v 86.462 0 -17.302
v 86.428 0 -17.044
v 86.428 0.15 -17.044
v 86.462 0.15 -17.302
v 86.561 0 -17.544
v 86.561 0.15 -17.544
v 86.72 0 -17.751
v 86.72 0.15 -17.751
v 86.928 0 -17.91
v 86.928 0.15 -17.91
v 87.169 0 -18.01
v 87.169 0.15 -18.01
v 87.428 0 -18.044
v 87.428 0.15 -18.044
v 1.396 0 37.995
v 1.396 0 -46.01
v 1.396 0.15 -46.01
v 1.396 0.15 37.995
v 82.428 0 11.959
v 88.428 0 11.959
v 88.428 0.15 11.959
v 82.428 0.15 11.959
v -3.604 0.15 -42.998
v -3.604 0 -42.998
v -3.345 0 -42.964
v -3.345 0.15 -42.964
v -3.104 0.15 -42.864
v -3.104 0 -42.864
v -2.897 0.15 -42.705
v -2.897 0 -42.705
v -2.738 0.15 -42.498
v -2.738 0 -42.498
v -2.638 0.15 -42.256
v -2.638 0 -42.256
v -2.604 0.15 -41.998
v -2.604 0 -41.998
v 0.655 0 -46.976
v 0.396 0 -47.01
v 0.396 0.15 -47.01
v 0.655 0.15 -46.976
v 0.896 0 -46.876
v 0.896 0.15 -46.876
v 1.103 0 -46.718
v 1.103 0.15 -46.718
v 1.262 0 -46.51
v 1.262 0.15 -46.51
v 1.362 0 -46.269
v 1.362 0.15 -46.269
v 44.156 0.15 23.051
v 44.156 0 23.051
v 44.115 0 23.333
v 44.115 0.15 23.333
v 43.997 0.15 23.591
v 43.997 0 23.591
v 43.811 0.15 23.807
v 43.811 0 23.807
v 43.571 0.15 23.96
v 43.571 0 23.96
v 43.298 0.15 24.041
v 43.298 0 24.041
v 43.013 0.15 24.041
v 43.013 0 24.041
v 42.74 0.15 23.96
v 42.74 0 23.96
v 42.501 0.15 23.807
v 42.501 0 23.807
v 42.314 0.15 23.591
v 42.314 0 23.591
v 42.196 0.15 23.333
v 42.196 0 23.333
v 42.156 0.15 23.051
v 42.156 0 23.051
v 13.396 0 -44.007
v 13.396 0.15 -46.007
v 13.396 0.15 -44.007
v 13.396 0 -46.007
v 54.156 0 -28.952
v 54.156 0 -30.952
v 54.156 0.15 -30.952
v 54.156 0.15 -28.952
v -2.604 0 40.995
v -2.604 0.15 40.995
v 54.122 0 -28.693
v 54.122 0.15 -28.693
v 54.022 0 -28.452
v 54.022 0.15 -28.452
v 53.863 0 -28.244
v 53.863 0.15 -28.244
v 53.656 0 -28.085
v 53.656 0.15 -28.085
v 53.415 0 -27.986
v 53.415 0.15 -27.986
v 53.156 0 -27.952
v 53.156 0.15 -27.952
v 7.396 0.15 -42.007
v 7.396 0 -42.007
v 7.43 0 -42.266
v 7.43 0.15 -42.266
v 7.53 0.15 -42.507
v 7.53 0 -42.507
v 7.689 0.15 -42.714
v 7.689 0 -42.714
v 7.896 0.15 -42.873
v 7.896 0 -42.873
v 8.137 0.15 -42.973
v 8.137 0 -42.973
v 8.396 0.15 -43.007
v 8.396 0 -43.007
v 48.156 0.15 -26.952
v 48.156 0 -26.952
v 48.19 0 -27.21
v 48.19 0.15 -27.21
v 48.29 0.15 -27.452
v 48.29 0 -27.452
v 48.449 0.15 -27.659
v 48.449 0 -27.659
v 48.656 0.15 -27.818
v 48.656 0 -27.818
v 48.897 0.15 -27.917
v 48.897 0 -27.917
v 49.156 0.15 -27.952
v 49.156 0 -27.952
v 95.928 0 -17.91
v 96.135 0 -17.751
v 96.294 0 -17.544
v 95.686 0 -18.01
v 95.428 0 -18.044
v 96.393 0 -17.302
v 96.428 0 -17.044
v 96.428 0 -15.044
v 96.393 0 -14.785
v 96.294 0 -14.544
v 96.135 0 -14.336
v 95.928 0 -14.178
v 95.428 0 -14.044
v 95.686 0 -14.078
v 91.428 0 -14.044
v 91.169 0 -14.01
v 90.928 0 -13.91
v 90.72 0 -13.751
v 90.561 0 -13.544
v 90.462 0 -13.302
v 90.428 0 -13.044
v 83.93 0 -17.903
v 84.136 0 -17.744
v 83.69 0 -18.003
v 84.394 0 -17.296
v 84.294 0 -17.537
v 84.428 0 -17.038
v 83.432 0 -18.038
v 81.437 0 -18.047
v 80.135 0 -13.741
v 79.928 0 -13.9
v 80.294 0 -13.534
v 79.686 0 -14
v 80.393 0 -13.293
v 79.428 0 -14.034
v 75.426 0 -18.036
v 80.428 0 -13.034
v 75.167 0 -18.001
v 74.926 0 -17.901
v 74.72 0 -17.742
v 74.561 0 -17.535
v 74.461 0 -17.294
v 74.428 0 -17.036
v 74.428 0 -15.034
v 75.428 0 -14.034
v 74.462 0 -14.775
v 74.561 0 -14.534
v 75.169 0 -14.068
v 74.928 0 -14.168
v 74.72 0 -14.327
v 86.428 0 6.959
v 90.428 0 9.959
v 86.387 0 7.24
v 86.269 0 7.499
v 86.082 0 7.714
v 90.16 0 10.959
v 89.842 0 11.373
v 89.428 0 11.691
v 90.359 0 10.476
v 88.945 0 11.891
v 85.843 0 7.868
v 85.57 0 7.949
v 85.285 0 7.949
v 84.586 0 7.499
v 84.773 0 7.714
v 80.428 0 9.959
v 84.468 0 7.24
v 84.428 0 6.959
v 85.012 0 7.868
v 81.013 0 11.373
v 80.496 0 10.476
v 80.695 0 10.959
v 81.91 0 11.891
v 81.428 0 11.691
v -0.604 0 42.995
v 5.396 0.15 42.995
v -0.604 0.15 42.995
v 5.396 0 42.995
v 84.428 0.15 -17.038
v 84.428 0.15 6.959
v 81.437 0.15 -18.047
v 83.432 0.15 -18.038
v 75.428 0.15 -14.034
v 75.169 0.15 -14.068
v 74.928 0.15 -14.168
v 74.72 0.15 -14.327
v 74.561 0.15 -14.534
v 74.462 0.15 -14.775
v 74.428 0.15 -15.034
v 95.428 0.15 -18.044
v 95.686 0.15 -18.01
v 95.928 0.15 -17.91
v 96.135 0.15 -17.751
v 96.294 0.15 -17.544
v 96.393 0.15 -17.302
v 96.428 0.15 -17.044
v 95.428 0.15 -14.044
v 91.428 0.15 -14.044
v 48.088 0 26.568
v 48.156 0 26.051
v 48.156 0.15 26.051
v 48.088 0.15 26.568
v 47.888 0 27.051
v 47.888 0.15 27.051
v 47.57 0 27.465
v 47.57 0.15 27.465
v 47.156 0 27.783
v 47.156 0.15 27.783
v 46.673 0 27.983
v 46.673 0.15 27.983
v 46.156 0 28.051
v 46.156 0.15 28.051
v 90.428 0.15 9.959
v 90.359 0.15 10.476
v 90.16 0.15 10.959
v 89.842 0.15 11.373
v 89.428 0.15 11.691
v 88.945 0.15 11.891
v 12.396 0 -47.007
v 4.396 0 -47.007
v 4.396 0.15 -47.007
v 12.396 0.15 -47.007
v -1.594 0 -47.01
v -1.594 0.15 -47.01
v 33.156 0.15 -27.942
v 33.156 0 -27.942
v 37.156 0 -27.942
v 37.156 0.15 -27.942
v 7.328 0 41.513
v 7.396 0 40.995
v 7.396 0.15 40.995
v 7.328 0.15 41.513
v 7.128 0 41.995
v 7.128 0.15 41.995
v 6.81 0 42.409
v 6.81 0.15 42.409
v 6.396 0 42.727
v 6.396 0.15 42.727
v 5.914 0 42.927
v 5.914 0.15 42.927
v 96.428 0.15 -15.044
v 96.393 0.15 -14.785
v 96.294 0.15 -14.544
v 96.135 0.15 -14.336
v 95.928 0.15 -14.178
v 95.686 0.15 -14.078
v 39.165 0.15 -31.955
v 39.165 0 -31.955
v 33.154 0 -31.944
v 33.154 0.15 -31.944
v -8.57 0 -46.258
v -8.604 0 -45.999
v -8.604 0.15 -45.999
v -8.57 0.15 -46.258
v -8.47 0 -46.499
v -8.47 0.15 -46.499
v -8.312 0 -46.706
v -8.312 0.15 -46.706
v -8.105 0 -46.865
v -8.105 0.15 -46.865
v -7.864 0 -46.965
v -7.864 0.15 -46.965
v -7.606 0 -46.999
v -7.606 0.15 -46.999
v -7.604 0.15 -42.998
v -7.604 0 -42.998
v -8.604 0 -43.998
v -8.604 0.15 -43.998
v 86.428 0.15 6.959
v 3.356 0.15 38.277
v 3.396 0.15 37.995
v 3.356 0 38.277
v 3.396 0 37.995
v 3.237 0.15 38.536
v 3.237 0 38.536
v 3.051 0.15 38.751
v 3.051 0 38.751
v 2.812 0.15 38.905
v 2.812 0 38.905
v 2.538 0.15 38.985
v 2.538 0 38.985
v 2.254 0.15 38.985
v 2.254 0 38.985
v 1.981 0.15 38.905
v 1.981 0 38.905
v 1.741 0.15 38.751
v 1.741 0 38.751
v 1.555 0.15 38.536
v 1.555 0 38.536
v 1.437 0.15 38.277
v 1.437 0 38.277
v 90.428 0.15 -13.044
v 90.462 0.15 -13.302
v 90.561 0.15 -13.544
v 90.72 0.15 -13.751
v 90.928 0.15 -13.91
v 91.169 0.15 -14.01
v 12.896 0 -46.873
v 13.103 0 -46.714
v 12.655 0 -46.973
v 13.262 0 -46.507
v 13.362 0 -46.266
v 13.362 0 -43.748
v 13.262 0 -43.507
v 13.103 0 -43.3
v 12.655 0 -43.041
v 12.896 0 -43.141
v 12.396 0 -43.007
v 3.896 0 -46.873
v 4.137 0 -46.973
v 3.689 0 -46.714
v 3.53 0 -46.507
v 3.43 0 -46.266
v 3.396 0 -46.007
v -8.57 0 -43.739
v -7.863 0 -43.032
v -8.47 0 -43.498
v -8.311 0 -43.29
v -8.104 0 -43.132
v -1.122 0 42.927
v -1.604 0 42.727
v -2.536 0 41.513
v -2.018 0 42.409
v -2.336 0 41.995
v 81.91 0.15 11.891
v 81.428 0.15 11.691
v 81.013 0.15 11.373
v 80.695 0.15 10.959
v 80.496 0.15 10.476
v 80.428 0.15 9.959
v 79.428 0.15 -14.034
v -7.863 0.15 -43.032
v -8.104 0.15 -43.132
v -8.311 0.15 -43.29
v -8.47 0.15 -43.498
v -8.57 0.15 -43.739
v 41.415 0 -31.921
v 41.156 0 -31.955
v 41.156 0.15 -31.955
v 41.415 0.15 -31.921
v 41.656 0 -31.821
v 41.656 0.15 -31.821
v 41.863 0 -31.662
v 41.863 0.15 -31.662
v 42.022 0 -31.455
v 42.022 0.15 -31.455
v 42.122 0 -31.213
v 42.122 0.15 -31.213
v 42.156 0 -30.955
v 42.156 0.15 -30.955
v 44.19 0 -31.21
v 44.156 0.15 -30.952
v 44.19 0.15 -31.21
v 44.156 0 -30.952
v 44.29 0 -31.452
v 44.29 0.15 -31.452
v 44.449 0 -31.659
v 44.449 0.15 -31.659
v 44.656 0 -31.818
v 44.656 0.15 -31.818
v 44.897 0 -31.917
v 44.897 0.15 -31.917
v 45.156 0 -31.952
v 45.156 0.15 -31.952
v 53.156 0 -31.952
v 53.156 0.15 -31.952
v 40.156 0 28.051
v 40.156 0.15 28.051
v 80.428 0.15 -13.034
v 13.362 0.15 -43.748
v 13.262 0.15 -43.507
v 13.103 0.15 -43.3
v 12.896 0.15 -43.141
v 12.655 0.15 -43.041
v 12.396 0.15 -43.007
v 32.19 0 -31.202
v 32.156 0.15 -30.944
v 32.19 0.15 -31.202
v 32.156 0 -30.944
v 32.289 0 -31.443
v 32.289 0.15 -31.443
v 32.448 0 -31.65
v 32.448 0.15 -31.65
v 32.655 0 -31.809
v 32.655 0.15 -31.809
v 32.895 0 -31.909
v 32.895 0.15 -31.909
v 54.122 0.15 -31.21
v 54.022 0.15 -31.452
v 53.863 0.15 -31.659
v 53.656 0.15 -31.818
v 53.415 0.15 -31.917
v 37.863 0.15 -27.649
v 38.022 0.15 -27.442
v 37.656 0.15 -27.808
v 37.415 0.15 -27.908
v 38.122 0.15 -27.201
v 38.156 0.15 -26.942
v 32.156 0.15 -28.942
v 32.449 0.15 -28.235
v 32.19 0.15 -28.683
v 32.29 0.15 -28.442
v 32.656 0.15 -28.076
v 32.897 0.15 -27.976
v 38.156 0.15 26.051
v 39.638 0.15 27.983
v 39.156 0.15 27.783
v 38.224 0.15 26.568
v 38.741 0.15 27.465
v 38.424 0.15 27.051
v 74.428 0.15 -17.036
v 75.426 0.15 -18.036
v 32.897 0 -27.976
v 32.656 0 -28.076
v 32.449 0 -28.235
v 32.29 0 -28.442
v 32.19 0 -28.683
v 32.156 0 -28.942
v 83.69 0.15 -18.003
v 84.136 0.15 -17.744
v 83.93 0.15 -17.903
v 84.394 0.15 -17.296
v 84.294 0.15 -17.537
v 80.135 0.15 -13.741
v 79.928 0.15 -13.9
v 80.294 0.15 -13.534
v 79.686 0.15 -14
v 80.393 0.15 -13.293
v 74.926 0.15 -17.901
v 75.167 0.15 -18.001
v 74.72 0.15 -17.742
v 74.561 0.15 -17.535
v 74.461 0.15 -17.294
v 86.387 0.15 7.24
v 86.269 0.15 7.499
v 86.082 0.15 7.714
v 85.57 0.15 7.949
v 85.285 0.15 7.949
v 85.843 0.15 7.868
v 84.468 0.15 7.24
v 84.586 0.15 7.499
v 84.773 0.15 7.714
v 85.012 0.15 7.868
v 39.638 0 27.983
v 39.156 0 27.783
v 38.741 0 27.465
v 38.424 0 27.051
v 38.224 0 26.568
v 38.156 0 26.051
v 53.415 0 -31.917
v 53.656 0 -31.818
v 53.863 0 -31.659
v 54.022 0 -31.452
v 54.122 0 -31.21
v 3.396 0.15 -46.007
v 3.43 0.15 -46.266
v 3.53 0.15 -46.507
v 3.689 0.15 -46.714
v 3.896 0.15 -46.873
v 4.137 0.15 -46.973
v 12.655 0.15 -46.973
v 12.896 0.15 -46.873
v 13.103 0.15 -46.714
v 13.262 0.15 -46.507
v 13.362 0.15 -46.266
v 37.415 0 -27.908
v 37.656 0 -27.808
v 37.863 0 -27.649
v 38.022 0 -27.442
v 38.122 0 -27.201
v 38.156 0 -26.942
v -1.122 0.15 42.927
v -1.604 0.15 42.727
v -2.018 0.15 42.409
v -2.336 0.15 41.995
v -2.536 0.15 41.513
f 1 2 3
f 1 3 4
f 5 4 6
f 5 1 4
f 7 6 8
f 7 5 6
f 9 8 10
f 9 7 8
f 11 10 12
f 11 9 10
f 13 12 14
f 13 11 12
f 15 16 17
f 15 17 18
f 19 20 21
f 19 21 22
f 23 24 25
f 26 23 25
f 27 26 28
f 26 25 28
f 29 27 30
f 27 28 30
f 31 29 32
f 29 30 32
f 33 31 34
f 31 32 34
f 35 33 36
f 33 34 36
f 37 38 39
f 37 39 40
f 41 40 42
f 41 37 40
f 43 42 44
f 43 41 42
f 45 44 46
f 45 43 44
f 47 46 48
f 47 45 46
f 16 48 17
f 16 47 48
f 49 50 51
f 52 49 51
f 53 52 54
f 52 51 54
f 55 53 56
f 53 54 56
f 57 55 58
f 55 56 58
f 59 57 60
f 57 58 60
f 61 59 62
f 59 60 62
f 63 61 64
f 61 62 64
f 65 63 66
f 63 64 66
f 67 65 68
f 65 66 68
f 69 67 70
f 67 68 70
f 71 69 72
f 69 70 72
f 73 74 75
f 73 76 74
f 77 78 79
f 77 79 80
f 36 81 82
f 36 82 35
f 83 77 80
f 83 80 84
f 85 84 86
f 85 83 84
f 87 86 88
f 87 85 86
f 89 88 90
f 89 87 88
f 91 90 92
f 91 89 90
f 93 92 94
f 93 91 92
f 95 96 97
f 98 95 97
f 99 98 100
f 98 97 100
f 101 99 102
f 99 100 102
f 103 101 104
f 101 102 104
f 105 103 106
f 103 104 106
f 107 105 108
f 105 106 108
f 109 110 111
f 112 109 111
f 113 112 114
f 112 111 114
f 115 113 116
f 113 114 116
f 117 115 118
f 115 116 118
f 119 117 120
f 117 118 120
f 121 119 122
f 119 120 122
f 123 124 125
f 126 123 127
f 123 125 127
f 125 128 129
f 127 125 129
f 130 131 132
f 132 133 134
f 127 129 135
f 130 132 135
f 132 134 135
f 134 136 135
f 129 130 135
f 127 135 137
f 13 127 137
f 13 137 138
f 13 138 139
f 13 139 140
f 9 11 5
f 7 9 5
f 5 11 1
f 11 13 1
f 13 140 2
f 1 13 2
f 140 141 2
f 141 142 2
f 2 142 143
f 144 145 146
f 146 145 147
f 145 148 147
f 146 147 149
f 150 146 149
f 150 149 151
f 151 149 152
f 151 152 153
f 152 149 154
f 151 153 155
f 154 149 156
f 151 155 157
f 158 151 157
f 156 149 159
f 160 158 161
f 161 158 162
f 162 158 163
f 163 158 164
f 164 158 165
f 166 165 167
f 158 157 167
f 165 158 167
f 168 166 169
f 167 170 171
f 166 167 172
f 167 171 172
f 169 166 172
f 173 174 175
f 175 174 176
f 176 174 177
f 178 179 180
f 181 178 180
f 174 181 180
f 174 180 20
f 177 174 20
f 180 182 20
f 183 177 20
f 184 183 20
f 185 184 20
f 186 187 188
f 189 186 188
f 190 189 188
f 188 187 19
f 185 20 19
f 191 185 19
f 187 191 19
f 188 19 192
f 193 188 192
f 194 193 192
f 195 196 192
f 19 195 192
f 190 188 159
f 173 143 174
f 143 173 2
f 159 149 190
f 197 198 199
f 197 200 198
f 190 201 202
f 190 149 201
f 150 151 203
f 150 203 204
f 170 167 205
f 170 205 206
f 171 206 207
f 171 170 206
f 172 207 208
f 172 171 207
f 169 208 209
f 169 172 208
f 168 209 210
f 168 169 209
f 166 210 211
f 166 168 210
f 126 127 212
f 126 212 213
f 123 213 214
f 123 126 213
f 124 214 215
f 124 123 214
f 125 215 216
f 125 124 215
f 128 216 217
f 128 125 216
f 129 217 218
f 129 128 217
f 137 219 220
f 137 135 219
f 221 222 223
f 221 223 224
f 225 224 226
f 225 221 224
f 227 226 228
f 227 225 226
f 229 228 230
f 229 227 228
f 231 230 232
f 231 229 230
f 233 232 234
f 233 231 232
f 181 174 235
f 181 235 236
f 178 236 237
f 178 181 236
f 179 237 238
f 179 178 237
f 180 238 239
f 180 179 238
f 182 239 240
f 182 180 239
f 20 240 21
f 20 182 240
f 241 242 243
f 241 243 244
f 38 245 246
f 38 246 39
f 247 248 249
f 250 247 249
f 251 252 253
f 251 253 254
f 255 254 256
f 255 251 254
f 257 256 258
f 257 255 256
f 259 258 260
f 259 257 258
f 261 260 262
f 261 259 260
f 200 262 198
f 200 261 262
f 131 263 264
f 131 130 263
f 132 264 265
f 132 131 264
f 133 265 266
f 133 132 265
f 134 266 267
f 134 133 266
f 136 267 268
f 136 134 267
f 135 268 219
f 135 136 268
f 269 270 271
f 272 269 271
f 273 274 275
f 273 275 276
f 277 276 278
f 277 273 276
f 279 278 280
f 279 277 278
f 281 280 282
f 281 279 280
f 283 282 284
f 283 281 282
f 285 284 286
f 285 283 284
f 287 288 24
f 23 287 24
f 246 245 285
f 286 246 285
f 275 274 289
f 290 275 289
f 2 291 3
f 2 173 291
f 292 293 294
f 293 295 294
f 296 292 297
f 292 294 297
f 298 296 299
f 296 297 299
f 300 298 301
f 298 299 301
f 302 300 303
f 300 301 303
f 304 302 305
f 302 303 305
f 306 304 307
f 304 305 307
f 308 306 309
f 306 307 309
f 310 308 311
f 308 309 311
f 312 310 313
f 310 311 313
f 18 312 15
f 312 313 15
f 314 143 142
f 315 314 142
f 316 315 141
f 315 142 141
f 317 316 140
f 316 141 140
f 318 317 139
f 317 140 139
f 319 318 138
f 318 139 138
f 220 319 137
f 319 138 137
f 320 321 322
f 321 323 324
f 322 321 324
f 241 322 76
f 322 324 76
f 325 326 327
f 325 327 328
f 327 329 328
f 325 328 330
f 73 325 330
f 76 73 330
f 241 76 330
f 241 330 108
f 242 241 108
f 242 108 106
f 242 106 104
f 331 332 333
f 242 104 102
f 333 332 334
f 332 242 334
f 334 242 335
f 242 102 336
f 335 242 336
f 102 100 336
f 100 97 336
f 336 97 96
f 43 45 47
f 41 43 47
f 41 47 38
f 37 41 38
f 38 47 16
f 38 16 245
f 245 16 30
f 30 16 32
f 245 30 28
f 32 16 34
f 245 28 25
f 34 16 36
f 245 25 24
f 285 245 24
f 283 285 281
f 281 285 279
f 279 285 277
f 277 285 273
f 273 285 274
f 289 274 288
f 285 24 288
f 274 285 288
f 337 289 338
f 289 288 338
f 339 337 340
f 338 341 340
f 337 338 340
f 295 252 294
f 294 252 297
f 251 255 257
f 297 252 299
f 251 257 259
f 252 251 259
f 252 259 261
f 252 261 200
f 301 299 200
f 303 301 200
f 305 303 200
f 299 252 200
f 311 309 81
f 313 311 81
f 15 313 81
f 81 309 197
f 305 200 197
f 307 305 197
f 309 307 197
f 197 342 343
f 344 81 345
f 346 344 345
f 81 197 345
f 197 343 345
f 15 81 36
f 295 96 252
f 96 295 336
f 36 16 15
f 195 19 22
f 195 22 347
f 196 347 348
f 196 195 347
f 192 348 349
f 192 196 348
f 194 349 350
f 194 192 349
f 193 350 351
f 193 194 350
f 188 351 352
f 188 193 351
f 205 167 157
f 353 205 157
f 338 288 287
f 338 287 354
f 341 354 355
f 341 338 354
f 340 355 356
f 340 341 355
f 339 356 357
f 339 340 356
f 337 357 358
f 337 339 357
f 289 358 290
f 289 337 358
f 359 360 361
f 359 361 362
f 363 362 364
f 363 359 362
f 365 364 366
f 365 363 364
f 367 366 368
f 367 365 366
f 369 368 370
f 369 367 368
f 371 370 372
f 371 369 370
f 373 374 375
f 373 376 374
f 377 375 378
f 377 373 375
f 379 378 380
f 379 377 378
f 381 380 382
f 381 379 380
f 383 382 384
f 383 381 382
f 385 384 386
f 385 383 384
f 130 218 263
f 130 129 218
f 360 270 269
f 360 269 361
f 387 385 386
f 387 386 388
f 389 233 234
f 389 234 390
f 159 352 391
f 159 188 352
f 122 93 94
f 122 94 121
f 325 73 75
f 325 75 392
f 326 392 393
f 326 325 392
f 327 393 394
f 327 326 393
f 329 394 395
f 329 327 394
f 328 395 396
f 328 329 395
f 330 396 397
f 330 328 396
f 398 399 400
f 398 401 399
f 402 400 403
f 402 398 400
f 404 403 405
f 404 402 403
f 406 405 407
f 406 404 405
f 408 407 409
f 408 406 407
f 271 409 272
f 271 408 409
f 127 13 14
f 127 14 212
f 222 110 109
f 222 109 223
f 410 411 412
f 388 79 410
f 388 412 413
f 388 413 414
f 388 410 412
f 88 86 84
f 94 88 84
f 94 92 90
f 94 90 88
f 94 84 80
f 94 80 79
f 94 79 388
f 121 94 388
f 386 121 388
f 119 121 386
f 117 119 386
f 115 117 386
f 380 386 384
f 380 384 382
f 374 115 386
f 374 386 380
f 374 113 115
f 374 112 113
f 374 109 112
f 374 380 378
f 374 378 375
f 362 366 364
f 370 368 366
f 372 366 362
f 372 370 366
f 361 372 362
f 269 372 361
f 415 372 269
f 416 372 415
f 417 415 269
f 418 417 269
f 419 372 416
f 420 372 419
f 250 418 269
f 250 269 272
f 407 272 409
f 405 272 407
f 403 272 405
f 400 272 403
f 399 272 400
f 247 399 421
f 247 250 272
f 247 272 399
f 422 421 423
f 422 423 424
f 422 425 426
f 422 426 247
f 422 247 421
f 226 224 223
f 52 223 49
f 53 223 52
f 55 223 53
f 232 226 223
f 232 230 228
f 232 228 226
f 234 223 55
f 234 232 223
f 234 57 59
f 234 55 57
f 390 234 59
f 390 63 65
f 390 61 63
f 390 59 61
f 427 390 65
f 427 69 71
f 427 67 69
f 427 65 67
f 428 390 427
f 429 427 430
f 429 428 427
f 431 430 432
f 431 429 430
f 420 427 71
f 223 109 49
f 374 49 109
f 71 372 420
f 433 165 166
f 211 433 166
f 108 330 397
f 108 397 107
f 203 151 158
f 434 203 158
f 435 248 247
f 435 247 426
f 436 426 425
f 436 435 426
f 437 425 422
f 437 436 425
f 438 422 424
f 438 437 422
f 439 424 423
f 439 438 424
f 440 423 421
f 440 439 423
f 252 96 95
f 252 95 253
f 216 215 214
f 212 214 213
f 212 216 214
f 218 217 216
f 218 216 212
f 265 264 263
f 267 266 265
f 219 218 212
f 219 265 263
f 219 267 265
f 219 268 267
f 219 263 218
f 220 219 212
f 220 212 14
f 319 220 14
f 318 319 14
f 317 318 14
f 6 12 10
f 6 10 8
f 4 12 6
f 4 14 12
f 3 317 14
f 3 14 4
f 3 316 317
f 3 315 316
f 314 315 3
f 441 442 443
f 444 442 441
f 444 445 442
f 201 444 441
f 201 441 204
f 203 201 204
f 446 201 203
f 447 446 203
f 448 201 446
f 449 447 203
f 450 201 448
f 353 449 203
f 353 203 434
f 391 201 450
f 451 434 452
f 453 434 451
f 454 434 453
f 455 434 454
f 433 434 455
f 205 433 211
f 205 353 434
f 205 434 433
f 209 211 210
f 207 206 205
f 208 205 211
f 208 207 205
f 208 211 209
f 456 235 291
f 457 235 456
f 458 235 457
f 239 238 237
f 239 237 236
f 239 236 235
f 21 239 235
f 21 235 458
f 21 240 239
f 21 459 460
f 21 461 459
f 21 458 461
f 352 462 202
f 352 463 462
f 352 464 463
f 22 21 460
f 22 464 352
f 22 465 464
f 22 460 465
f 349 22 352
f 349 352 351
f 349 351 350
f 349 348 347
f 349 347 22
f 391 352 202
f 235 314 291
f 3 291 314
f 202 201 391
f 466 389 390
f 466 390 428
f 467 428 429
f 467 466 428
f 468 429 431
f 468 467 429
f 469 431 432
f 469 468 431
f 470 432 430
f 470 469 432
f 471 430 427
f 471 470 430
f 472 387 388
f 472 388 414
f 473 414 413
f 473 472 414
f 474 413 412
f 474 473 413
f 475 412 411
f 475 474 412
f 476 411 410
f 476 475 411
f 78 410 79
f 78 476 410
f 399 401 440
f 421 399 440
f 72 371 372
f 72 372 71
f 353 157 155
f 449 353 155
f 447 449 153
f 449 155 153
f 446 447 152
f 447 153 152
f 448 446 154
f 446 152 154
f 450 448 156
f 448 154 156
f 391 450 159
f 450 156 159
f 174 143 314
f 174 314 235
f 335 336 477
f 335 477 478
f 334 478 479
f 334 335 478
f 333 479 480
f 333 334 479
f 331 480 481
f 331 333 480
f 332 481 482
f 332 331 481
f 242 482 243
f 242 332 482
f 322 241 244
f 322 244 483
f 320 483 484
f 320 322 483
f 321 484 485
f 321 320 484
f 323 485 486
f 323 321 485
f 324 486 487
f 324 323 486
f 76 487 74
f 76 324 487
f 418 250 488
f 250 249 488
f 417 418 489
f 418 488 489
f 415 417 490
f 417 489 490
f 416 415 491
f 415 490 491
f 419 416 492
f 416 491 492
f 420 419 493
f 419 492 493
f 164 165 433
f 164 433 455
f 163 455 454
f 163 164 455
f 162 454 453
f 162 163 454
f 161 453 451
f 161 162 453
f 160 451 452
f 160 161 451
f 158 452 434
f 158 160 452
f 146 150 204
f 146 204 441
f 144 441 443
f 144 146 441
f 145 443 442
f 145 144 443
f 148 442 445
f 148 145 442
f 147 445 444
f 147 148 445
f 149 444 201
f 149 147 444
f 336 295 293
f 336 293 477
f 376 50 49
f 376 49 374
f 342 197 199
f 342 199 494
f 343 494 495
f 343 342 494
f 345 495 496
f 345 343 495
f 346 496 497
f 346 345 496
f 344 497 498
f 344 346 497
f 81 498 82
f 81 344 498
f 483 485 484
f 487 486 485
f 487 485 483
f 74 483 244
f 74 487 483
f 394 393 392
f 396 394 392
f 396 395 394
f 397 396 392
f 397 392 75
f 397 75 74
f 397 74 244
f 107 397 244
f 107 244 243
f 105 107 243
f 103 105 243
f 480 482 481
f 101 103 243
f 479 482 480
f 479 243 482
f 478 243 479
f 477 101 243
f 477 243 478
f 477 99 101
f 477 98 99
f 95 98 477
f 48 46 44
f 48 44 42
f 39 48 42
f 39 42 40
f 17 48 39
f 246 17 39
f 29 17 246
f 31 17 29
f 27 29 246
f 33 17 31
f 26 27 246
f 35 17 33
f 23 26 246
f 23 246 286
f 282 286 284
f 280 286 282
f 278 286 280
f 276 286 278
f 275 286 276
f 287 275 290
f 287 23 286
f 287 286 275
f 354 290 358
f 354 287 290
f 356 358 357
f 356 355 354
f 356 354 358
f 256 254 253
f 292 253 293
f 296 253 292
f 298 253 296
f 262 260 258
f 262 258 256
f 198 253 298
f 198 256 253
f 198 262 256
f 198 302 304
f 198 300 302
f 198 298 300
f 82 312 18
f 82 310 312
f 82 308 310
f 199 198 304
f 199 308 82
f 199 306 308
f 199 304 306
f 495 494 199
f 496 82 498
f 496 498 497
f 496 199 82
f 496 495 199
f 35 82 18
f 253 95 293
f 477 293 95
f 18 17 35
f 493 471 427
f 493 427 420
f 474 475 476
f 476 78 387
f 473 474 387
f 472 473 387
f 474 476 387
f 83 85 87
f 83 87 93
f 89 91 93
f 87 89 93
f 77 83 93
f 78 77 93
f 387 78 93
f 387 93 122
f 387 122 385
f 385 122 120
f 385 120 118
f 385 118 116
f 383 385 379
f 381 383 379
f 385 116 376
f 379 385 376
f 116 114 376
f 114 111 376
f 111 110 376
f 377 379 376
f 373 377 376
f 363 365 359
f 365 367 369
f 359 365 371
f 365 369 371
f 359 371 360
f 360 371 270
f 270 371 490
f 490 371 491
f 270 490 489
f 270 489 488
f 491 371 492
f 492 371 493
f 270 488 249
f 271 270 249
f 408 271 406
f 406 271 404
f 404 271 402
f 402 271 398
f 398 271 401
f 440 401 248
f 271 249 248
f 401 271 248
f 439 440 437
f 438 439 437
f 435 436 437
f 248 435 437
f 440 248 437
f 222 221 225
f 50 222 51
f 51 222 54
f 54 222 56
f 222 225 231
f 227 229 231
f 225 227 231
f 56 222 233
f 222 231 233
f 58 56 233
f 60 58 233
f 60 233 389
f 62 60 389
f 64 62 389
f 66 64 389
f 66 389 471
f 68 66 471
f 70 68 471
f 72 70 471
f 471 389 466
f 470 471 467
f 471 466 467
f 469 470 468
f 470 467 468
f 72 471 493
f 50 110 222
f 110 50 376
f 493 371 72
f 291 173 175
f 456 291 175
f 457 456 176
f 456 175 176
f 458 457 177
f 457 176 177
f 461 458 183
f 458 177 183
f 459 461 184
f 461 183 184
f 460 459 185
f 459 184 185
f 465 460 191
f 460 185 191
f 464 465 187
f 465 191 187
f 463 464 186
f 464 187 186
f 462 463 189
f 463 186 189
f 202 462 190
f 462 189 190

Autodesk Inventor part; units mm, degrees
ref_plane "YZ Plane" through (0, 0, 0) normal (1, 0, 0) x (0, 1, 0)
ref_plane "XZ Plane" through (0, 0, 0) normal (0, 1, 0) x (-1, 0, 0)
ref_plane "XY Plane" through (0, 0, 0) normal (0, 0, 1) x (1, 0, 0)
sketch "Sketch1" plane through (0, 0, 0) normal (0, 1, 0) x (-1, 0, 0)
  arc A0 (-5.3961, 42.9951) -> (-7.3961, 40.9951) centre (-5.3961, 40.9951) ccw
  arc A1 (2.6039, 40.9951) -> (0.6039, 42.9951) centre (0.6039, 40.9951) ccw
  line L0 (-5.3961, 42.9951) -> (0.6039, 42.9951)
  line L1 (-2.3961, 38.9951) -> (-2.3961, 38.9951)
  arc A2 (-2.3961, 38.9951) -> (-3.3961, 37.9951) centre (-2.3961, 37.9951) ccw
  arc A3 (-1.3961, 37.9951) -> (-2.3961, 38.9951) centre (-2.3961, 37.9951) ccw
  line L2 (2.6039, 40.9951) -> (2.6039, -38.9794)
  line L3 (-7.3961, 40.9951) -> (-7.3961, -39.0072)
  line L4 (2.6039, -41.9976) -> (2.6039, -35.4252)
  line L5 (-7.3961, -42.0072) -> (-7.3961, -39.0072)
  arc A4 (-8.3961, -43.0072) -> (-7.3961, -42.0072) centre (-8.3961, -42.0072) ccw
  line L6 (-3.3961, 37.9951) -> (-3.3961, -46.0072)
  line L7 (-1.3961, -46.0104) -> (-1.3961, 37.9951)
  line L8 (-4.3961, -47.0072) -> (-12.3961, -47.0072)
  line L9 (-12.3961, -43.0072) -> (-8.3961, -43.0072)
  arc A5 (-12.3961, -43.0072) -> (-13.3961, -44.0072) centre (-12.3961, -44.0072) ccw
  line L10 (-13.3961, -46.0072) -> (-13.3961, -44.0072)
  arc A6 (-13.3961, -46.0072) -> (-12.3961, -47.0072) centre (-12.3961, -46.0072) ccw
  arc A7 (-1.3961, -46.0104) -> (-0.3961, -47.0104) centre (-0.3961, -46.0104) ccw
  arc A8 (-4.3961, -47.0072) -> (-3.3961, -46.0072) centre (-4.3961, -46.0072) ccw
  line L11 (1.5945, -47.0104) -> (-0.3961, -47.0104)
  line L12 (1.5945, -47.0104) -> (7.6057, -46.9994)
  line L13 (8.6039, -45.9994) -> (8.6039, -43.9976)
  line L14 (7.6039, -42.9976) -> (3.6039, -42.9976)
  arc A9 (7.6057, -46.9994) -> (8.6039, -45.9994) centre (7.6039, -45.9994) ccw
  arc A10 (8.6039, -43.9976) -> (7.6039, -42.9976) centre (7.6039, -43.9976) ccw
  arc A11 (2.6039, -41.9976) -> (3.6039, -42.9976) centre (3.6039, -41.9976) ccw
  arc A12 (-42.1557, -30.9546) -> (-41.1557, -31.9546) centre (-41.1557, -30.9546) ccw
  line L15 (-39.165, -31.9546) -> (-41.1557, -31.9546)
  line L16 (-38.1557, -26.9419) -> (-38.1557, -20.3695)
  arc A13 (-38.1557, -26.9419) -> (-37.1557, -27.9419) centre (-37.1557, -26.9419) ccw
  line L17 (-39.165, -31.9546) -> (-33.1539, -31.9437)
  line L18 (-33.1557, -27.9419) -> (-37.1557, -27.9419)
  arc A14 (-32.1557, -28.9419) -> (-33.1557, -27.9419) centre (-33.1557, -28.9419) ccw
  line L19 (-32.1557, -30.9437) -> (-32.1557, -28.9419)
  arc A15 (-33.1539, -31.9437) -> (-32.1557, -30.9437) centre (-33.1557, -30.9437) ccw
  arc A16 (-45.1557, -31.9515) -> (-44.1557, -30.9515) centre (-45.1557, -30.9515) ccw
  line L20 (-45.1557, -31.9515) -> (-53.1557, -31.9515)
  line L21 (-54.1557, -30.9515) -> (-54.1557, -28.9515)
  line L22 (-53.1557, -27.9515) -> (-49.1557, -27.9515)
  line L23 (-48.1557, -26.9515) -> (-48.1557, -23.9515)
  arc A17 (-49.1557, -27.9515) -> (-48.1557, -26.9515) centre (-49.1557, -26.9515) ccw
  arc A18 (-54.1557, -30.9515) -> (-53.1557, -31.9515) centre (-53.1557, -30.9515) ccw
  arc A19 (-53.1557, -27.9515) -> (-54.1557, -28.9515) centre (-53.1557, -28.9515) ccw
  line L24 (-44.1557, 23.0508) -> (-44.1557, -30.9515)
  line L25 (-42.1557, -30.9546) -> (-42.1557, 23.0508)
  line L26 (-43.1557, 24.0508) -> (-43.1557, 24.0508)
  line L27 (-48.1557, 26.0508) -> (-48.1557, -23.9515)
  line L28 (-46.1557, 28.0508) -> (-40.1557, 28.0508)
  line L29 (-38.1557, 26.0508) -> (-38.1557, -23.9237)
  arc A20 (-46.1557, 28.0508) -> (-48.1557, 26.0508) centre (-46.1557, 26.0508) ccw
  arc A21 (-38.1557, 26.0508) -> (-40.1557, 28.0508) centre (-40.1557, 26.0508) ccw
  arc A22 (-42.1557, 23.0508) -> (-43.1557, 24.0508) centre (-43.1557, 23.0508) ccw
  arc A23 (-43.1557, 24.0508) -> (-44.1557, 23.0508) centre (-43.1557, 23.0508) ccw
  line L30 (-81.4368, -18.0467) -> (-83.4318, -18.0382)
  line L31 (-87.4275, -18.0436) -> (-95.4275, -18.0436)
  line L32 (-81.4368, -18.0467) -> (-75.4257, -18.0358)
  line L33 (-86.4275, 6.9587) -> (-86.4275, -17.0436)
  line L34 (-84.4275, -17.0382) -> (-84.4275, 6.9587)
  line L35 (-85.4275, 7.9587) -> (-85.4275, 7.9587)
  line L36 (-90.4275, 9.9587) -> (-90.4275, -10.0436)
  line L37 (-88.4275, 11.9587) -> (-82.4275, 11.9587)
  line L38 (-80.4275, 9.9587) -> (-80.4275, -10.0158)
  arc A24 (-88.4275, 11.9587) -> (-90.4275, 9.9587) centre (-88.4275, 9.9587) ccw
  arc A25 (-80.4275, 9.9587) -> (-82.4275, 11.9587) centre (-82.4275, 9.9587) ccw
  line L39 (-74.4275, -17.0358) -> (-74.4275, -15.034)
  line L40 (-75.4275, -14.034) -> (-79.4275, -14.034)
  line L41 (-80.4275, -13.034) -> (-80.4275, -6.4616)
  line L42 (-96.4275, -17.0436) -> (-96.4275, -15.0436)
  line L43 (-95.4275, -14.0436) -> (-91.4275, -14.0436)
  line L44 (-90.4275, -13.0436) -> (-90.4275, -10.0436)
  arc A26 (-91.4275, -14.0436) -> (-90.4275, -13.0436) centre (-91.4275, -13.0436) ccw
  arc A27 (-95.4275, -14.0436) -> (-96.4275, -15.0436) centre (-95.4275, -15.0436) ccw
  arc A28 (-96.4275, -17.0436) -> (-95.4275, -18.0436) centre (-95.4275, -17.0436) ccw
  arc A29 (-87.4275, -18.0436) -> (-86.4275, -17.0436) centre (-87.4275, -17.0436) ccw
  arc A30 (-84.4275, -17.0382) -> (-83.4318, -18.0382) centre (-83.4275, -17.0382) ccw
  arc A31 (-75.4257, -18.0358) -> (-74.4275, -17.0358) centre (-75.4275, -17.0358) ccw
  arc A32 (-74.4275, -15.034) -> (-75.4275, -14.034) centre (-75.4275, -15.034) ccw
  arc A33 (-80.4275, -13.034) -> (-79.4275, -14.034) centre (-79.4275, -13.034) ccw
  arc A34 (-85.4275, 7.9587) -> (-86.4275, 6.9587) centre (-85.4275, 6.9587) ccw
  arc A35 (-84.4275, 6.9587) -> (-85.4275, 7.9587) centre (-85.4275, 6.9587) ccw
  point P0 (0, 0)
  point P1 (1.3964, -43.0157)
  point P2 (-2.3961, 38.9951)
  point P3 (2.2842, -26.5744)
  point P4 (-1.3961, -47.0104)
  point P5 (-13.3961, -47.0072)
  point P6 (-13.3961, -43.0072)
  point P7 (4.6001, -47.0049)
  point P8 (8.6039, -46.9976)
  point P9 (8.6039, -42.9976)
  point P10 (-40.3838, -15.9392)
  point P11 (-42.1557, -31.9546)
  point P12 (-36.1594, -31.9492)
  point P13 (-32.1557, -31.9419)
  point P14 (-32.1557, -27.9419)
  point P15 (-54.1557, -31.9515)
  point P16 (-54.1557, -27.9515)
  point P17 (-38.4753, -11.5187)
  point P18 (-43.1557, 24.0508)
  point P19 (-43.1557, 28.0508)
  point P20 (-80.7471, 2.3892)
  point P21 (-84.4275, -18.034)
  point P22 (-78.4312, -18.0413)
  point P23 (-96.4275, -18.0436)
  point P24 (-74.4275, -18.034)
  point P25 (-85.4275, 11.9587)
  point P26 (-74.4275, -14.034)
  point P27 (-96.4275, -14.0436)
  point P28 (-80.4275, -10.0158)
  point P29 (-85.4275, 7.9587)
  point P30 (-43.1557, 24.0508)
  dimension "d0" = 10
  dimension "d1" = 4
  dimension "d2" = 4
  dimension "d3" = 2
  dimension "d5" = 90
  dimension "d6" = 2
  dimension "d7" = 4
  dimension "d8" = 4
  dimension "d9" = 1
  dimension "d10" = 1
  dimension "d11" = 10
  dimension "d12" = 4
  dimension "d13" = 4
  dimension "d14" = 2
  dimension "d15" = 4
  dimension "d16" = 60
  dimension "d17" = 2
  dimension "d18" = 4
  dimension "d19" = 4
  dimension "d20" = 1
  dimension "d21" = 1
  dimension "d22" = 10
  dimension "d23" = 4
  dimension "d24" = 4
  dimension "d25" = 2
  dimension "d26" = 4
  dimension "d27" = 30
  dimension "d28" = 2
  dimension "d29" = 4
  dimension "d30" = 4
  dimension "d31" = 1
  dimension "d32" = 1
extrude "Extrusion1" add sketch "Sketch1" along normal blind 0.15
properties part number "SensoriColorati"
